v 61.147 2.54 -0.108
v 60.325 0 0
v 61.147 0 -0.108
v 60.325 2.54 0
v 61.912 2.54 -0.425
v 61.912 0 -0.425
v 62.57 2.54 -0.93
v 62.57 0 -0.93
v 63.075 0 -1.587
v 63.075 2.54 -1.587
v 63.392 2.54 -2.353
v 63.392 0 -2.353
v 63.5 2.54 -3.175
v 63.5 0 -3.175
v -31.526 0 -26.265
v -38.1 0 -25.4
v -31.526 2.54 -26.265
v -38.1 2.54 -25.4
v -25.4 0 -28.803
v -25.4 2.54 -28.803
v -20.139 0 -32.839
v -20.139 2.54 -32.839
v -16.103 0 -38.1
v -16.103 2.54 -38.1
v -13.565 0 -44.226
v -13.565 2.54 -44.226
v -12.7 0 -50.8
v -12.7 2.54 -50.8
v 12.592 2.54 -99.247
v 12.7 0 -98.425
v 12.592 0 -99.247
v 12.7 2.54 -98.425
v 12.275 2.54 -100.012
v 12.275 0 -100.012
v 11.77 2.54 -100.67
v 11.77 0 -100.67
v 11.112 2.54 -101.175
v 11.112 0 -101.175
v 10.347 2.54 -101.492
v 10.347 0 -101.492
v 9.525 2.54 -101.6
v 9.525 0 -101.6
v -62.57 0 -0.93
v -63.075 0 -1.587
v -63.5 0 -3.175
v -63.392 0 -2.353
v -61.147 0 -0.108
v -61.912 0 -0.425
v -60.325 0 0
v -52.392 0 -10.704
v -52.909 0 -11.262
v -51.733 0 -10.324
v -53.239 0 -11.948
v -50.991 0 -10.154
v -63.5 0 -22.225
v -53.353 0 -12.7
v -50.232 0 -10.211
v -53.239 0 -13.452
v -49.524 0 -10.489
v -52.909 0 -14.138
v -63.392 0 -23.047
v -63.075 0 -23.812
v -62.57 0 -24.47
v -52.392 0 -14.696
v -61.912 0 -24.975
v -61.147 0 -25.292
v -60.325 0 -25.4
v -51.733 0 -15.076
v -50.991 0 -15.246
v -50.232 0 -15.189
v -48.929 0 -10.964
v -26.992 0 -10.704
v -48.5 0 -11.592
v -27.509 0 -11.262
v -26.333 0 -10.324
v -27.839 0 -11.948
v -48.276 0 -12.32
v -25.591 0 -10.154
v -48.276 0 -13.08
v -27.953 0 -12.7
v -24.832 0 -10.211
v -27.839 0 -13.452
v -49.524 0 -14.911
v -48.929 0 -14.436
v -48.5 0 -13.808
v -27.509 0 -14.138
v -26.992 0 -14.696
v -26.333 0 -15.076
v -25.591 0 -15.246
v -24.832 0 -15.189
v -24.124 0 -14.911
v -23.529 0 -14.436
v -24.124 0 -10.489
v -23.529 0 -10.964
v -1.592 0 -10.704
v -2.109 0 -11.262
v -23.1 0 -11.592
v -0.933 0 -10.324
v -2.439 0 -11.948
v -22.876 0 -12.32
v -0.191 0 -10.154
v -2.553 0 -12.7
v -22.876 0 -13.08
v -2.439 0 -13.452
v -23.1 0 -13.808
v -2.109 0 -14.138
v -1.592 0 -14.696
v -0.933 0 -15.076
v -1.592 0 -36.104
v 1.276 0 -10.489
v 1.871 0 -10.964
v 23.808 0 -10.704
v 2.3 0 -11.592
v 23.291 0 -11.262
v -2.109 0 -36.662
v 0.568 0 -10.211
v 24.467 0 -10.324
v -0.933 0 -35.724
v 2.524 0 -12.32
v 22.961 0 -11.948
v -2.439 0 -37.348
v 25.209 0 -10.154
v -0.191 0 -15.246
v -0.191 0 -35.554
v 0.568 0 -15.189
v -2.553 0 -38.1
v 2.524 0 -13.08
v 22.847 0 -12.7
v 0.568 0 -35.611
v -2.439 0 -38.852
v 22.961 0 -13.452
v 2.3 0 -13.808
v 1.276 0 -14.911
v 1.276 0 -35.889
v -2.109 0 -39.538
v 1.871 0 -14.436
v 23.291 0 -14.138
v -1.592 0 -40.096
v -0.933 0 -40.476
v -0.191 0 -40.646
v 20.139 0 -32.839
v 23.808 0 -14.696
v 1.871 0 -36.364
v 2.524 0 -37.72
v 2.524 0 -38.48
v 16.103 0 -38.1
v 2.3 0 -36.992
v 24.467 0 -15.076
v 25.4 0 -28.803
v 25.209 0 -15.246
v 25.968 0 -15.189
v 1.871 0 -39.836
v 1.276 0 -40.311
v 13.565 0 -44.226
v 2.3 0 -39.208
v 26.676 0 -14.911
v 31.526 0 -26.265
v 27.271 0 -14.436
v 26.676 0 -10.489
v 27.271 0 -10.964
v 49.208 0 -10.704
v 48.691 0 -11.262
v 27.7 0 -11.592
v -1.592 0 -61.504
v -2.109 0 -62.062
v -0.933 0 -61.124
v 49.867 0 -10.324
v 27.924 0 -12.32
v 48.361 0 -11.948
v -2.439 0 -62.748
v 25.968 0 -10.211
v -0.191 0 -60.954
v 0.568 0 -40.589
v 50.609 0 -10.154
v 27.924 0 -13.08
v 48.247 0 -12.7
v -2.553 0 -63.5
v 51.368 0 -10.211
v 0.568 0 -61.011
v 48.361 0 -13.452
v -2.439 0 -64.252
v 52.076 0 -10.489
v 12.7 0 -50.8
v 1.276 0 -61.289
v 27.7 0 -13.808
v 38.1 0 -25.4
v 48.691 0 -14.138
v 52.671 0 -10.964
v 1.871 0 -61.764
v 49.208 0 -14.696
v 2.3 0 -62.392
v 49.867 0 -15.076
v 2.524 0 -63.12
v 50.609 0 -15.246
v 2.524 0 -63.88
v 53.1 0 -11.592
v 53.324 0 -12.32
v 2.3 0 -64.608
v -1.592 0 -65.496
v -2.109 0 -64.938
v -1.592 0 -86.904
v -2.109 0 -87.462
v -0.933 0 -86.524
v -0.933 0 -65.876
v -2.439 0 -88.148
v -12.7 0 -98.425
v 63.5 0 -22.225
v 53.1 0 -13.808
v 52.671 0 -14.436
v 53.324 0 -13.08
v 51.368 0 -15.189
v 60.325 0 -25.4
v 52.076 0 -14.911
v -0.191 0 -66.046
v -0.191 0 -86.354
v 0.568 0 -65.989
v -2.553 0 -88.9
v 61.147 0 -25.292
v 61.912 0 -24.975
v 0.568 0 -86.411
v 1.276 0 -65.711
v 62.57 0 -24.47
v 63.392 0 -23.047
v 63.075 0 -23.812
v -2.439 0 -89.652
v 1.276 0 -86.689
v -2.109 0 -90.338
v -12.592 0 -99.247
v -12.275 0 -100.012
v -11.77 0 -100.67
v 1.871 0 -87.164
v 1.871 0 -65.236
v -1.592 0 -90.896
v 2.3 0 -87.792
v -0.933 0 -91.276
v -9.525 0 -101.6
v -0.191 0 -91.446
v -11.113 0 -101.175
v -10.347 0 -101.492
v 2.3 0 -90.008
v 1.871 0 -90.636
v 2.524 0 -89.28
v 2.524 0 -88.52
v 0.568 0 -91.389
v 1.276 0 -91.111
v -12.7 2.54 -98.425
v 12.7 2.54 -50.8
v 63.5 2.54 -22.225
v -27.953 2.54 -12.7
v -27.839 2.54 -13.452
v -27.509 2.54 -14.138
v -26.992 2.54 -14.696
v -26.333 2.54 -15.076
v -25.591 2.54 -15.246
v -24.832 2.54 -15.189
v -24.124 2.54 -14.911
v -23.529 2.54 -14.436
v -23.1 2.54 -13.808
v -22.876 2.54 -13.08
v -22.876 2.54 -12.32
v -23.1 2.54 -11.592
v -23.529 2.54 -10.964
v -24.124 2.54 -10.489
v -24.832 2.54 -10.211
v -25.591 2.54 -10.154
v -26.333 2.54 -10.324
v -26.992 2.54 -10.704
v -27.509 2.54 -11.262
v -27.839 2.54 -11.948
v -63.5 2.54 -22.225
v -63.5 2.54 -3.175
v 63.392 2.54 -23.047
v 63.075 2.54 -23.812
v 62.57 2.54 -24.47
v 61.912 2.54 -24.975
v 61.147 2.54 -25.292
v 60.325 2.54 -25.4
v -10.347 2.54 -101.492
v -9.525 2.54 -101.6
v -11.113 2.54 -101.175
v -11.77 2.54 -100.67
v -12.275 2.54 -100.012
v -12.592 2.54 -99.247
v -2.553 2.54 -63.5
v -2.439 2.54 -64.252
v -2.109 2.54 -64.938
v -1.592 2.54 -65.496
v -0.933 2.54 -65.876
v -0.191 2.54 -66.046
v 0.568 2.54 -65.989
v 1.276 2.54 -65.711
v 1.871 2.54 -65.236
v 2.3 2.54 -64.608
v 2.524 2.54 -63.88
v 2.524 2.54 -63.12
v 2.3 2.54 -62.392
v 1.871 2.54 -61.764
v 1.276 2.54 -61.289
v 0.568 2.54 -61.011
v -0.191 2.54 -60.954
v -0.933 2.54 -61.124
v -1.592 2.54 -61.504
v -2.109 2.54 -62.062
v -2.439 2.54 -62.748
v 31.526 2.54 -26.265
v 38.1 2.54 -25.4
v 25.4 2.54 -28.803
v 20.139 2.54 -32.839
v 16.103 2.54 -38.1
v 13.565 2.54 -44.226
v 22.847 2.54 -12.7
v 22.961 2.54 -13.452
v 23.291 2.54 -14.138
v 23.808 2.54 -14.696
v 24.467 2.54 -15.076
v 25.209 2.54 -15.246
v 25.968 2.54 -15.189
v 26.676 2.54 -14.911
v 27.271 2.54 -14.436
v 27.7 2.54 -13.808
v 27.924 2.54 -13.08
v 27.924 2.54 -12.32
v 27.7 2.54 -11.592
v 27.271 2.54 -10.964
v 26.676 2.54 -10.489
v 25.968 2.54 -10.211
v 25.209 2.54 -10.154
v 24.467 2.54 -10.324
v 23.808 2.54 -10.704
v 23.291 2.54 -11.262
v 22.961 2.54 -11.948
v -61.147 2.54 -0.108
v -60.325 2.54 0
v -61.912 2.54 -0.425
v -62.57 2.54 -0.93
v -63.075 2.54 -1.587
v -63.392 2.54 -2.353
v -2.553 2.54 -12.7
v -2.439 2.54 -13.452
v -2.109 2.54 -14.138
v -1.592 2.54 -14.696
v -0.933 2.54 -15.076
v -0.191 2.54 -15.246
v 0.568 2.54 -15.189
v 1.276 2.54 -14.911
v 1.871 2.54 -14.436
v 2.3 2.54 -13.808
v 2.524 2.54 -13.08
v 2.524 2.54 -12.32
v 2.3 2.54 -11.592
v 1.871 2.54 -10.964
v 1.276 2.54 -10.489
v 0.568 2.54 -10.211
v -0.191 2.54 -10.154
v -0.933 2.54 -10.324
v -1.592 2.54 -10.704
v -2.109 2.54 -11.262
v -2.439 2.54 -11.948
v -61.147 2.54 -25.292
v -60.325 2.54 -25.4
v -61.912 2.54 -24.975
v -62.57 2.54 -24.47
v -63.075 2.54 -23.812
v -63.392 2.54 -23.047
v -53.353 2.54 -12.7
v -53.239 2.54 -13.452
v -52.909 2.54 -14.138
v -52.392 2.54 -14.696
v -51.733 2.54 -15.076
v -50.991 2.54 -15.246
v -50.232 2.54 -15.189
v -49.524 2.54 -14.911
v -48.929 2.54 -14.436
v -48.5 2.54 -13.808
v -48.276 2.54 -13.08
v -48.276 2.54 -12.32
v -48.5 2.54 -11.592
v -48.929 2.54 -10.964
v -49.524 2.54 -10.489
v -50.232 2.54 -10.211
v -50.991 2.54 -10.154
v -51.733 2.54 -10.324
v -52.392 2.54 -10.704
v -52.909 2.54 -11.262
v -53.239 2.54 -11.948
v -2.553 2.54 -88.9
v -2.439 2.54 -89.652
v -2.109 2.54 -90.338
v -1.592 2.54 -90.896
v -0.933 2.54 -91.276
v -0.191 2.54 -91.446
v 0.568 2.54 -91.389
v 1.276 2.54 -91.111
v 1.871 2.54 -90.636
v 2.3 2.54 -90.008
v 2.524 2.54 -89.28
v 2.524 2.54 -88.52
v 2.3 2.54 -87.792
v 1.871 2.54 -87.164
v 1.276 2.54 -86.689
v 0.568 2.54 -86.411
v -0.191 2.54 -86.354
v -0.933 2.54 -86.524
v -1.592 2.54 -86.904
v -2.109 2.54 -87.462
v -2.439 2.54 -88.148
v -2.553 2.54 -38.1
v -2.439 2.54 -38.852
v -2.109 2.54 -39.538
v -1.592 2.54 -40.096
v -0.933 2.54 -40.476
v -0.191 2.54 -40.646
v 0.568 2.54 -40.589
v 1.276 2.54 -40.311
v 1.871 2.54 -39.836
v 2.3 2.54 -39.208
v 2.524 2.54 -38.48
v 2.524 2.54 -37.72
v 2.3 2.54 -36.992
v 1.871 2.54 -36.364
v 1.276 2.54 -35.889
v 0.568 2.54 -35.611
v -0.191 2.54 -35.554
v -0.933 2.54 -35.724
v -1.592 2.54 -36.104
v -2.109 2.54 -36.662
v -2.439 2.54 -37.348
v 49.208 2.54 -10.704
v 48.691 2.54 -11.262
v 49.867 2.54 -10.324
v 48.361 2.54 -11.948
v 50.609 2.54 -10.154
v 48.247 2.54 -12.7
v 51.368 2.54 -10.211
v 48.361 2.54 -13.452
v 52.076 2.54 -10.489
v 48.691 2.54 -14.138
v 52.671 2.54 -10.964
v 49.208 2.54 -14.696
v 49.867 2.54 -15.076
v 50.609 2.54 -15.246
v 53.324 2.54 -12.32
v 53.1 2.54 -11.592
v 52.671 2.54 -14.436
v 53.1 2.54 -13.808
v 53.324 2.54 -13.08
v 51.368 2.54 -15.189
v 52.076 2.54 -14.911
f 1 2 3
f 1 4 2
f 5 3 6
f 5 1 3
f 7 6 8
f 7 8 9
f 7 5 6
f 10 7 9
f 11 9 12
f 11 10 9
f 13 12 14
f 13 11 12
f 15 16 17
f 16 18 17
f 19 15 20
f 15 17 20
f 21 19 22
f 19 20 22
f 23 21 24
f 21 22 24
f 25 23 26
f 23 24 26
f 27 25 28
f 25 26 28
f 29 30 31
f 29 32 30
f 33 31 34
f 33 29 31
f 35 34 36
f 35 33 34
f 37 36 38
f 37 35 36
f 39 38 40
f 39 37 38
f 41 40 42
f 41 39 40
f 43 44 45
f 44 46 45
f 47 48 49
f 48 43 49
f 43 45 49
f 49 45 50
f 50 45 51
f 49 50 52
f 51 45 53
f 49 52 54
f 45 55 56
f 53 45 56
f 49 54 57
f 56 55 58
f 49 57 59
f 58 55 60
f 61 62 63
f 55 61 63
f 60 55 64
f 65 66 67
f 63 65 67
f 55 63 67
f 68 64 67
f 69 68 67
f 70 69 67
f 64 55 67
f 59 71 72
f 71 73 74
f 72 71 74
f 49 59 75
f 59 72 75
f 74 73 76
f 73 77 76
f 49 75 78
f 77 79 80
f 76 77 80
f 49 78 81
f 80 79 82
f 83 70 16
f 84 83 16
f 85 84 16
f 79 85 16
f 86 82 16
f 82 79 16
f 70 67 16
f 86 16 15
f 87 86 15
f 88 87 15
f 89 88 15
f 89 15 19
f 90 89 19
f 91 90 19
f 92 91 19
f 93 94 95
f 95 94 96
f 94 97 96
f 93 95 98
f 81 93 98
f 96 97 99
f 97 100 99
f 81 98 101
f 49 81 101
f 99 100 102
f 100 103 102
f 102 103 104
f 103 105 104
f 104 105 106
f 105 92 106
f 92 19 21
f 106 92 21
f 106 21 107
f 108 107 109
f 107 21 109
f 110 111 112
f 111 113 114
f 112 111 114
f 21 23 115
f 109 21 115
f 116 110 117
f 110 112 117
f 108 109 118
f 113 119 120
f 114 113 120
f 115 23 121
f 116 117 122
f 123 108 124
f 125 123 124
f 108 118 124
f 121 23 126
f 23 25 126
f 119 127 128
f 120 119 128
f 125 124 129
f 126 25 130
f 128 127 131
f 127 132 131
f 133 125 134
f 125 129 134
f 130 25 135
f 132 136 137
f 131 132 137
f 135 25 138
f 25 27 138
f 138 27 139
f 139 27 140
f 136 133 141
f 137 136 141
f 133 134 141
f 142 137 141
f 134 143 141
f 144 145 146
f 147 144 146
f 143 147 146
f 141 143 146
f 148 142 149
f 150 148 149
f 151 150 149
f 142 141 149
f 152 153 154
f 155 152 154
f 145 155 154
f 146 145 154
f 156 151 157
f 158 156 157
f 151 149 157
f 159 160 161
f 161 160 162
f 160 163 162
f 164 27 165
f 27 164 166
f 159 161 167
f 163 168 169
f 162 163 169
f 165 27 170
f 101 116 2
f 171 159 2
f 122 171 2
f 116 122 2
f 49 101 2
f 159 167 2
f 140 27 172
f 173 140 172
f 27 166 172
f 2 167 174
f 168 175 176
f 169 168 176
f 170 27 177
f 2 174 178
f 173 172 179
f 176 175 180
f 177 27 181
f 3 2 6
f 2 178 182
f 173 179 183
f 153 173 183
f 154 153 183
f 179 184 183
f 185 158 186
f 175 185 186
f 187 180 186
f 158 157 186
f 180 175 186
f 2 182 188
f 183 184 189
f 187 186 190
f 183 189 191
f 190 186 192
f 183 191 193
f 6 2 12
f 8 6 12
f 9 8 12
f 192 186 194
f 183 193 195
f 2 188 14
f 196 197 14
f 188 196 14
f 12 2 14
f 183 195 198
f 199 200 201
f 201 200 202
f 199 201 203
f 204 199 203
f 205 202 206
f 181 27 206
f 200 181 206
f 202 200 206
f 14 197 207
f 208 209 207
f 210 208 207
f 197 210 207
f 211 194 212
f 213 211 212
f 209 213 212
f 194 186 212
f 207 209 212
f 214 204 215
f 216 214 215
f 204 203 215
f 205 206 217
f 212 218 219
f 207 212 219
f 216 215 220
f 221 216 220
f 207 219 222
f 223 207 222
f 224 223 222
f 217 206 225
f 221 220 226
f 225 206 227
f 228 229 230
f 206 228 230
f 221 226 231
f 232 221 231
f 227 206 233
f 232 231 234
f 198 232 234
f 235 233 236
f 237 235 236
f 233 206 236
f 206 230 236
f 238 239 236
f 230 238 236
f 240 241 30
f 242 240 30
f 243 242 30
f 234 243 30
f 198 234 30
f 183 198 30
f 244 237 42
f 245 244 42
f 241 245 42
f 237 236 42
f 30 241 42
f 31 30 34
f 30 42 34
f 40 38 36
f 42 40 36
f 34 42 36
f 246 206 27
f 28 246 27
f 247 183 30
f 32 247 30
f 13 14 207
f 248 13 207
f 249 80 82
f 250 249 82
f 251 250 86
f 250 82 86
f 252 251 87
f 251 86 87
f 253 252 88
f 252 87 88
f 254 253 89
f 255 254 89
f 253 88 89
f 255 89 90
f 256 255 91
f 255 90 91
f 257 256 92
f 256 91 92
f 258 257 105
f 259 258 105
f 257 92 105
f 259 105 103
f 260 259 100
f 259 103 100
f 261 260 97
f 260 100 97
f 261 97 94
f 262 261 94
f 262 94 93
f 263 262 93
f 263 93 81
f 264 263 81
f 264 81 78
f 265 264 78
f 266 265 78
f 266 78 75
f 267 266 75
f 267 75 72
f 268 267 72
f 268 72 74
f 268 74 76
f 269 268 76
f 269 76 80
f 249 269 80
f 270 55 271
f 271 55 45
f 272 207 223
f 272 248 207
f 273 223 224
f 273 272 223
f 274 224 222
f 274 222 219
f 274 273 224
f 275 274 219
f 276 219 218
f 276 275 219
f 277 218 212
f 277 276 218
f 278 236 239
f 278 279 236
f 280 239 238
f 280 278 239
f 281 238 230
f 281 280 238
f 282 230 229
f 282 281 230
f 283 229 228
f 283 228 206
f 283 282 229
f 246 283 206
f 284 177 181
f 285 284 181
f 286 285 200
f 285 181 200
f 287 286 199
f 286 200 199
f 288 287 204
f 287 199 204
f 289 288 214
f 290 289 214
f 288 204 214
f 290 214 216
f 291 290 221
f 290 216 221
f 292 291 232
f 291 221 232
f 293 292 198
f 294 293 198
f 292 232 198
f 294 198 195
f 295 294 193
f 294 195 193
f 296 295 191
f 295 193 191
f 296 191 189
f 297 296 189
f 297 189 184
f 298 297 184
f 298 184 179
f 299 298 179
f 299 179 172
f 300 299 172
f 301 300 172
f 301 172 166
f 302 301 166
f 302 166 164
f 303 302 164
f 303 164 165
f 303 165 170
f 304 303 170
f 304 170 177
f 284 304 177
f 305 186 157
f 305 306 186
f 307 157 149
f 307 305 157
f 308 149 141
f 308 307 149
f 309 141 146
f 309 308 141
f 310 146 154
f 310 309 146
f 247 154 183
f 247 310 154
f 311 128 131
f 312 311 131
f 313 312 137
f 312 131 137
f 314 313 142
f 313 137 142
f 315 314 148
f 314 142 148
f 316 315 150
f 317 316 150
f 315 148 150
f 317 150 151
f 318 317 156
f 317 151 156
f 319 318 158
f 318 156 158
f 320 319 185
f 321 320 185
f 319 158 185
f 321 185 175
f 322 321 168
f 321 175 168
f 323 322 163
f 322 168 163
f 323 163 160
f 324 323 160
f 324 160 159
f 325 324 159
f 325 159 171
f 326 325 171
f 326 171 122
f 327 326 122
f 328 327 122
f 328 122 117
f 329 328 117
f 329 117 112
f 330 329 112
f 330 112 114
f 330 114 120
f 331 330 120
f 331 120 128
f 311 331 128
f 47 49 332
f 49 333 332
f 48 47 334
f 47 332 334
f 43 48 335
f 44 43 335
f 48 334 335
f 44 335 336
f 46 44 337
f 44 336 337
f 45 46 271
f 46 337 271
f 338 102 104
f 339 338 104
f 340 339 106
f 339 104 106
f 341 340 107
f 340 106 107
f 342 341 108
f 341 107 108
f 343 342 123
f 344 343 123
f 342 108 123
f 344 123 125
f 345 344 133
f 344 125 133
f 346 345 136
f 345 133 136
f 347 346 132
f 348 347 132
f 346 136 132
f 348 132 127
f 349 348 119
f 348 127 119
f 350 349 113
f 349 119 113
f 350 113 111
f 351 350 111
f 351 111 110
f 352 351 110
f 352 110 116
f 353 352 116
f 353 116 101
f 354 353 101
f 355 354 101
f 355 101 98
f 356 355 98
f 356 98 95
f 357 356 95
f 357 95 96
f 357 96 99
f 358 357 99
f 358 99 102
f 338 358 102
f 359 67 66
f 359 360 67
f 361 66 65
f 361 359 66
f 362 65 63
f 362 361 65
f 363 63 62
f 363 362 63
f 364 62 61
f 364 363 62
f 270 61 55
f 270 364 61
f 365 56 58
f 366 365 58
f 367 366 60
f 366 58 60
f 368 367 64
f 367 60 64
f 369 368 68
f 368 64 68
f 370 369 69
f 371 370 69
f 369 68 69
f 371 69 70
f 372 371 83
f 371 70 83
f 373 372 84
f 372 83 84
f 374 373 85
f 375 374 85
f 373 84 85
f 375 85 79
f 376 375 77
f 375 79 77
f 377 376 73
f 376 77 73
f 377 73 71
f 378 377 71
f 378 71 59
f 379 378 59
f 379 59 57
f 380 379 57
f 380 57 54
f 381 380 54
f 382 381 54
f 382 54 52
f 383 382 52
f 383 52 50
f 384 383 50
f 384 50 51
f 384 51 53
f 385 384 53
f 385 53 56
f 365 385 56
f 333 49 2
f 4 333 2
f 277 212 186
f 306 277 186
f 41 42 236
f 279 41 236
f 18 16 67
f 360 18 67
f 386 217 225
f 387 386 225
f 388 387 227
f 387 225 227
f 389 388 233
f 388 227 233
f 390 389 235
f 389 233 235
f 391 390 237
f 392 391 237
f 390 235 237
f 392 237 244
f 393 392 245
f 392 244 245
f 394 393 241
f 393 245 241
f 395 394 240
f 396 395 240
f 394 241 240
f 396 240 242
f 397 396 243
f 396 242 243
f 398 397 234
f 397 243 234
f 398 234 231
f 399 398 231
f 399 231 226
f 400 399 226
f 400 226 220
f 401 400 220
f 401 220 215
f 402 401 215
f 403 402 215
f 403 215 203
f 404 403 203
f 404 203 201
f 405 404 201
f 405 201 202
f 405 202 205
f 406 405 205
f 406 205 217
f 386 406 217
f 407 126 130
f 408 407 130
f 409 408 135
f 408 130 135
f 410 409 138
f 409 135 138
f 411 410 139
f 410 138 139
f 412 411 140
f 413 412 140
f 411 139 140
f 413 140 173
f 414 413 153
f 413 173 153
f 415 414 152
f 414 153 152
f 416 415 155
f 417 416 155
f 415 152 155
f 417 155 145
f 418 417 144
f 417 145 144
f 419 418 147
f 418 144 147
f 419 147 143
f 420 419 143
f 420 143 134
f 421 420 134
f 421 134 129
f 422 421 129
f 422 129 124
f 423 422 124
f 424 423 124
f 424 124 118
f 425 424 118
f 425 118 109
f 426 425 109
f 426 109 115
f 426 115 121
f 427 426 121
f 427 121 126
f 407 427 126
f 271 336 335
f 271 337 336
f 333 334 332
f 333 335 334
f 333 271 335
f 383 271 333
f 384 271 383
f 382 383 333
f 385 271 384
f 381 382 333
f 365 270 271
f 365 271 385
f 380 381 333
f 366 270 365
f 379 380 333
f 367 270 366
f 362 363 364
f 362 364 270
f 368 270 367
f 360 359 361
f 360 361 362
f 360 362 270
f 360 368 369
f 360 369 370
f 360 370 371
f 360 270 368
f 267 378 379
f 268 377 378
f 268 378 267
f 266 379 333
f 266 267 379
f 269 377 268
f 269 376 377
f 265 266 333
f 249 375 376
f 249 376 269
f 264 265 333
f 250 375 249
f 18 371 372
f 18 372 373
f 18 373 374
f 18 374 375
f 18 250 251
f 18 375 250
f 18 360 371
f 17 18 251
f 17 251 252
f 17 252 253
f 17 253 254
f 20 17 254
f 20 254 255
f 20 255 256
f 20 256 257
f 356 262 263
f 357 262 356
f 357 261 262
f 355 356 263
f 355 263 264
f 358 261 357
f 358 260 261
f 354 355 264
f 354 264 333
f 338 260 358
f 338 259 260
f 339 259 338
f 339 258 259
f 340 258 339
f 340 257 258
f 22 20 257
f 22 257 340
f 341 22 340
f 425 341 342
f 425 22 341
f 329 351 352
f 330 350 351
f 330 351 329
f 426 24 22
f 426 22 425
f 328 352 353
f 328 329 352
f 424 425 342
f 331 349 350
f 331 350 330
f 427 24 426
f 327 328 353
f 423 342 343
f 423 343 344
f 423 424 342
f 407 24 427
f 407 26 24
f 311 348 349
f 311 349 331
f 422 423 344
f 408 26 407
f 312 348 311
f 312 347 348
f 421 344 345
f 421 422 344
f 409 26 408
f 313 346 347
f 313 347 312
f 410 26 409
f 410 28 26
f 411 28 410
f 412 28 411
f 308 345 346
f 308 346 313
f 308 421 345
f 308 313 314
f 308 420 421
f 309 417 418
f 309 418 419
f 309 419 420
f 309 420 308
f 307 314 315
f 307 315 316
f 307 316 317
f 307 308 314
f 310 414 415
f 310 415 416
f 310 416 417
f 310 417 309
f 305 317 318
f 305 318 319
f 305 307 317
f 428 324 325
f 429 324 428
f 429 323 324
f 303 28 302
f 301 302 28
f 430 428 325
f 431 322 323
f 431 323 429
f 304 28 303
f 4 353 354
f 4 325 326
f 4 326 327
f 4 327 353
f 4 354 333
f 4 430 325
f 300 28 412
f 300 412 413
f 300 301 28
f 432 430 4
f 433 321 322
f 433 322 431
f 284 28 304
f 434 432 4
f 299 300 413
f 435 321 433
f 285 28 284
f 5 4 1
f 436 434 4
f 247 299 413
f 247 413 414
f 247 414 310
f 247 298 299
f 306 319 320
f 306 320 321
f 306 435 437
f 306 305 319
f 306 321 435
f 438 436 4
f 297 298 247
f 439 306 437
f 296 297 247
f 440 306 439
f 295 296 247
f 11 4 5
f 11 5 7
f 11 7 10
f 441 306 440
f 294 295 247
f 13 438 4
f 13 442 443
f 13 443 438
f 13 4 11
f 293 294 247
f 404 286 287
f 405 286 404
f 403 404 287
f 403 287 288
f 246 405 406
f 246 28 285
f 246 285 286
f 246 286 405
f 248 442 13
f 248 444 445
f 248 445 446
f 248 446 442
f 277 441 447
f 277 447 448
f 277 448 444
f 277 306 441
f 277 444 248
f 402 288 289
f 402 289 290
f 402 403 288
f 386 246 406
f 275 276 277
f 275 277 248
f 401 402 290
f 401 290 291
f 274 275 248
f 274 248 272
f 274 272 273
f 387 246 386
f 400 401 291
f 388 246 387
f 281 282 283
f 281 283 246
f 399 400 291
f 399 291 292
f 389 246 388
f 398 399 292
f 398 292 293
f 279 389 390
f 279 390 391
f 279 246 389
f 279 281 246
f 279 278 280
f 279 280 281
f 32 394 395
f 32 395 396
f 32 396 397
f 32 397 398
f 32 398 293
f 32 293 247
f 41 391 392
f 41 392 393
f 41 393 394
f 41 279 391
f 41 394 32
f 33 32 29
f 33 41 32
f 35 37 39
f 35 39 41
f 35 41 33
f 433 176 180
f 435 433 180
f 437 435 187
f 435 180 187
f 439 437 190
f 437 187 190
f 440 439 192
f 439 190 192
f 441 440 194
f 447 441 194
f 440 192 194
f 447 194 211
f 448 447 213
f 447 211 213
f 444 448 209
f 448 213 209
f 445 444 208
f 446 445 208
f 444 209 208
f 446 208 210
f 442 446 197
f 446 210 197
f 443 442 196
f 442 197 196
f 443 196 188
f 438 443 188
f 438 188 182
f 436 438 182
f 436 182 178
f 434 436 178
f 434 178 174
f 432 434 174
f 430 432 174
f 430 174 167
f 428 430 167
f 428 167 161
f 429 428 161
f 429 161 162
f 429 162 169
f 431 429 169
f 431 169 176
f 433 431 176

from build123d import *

# Parameters (mm, degrees)
BOSS_EXTRUDE1_DEPTH        = 2.54
FILLET1_R                  = 3.175
F_7_0_201_DIAMETER_HOLE1_D = 5.1054
FILLET2_R                  = 25.4


with BuildPart() as part:
    # Sketch1 → Boss-Extrude1 (new body)
    with BuildSketch(Plane(origin=(0, 0, 0), x_dir=(1, 0, 0), z_dir=(0, 1, 0))):
        Polygon((-63.5, 0), (63.5, 0), (63.5, 25.4), (12.7, 25.4), (12.7, 101.6), (-12.7, 101.6), (-12.7, 25.4), (-63.5, 25.4), align=None)
    extrude(amount=BOSS_EXTRUDE1_DEPTH)

    # Fillet1
    fillet1_edges = [part.edges().sort_by_distance(p)[0] for p in [
        (-12.7, 1.27, -101.6),
        (12.7, 1.27, -101.6),
        (63.5, 1.27, -25.4),
        (63.5, 1.27, 0),
        (-63.5, 1.27, 0),
        (-63.5, 1.27, -25.4),
    ]]
    fillet(fillet1_edges, radius=FILLET1_R)

    # #7 (0.201) Diameter Hole1 (through all)
    with Locations(Plane(origin=(0, 2.54, 0), x_dir=(1, 0, 0), z_dir=(0, 1, 0))):
        with Locations((0, 12.7), (25.4, 12.7), (50.8, 12.7), (-25.4, 12.7), (-50.8, 12.7), (0, 38.1), (0, 63.5), (0, 88.9)):
            Hole(F_7_0_201_DIAMETER_HOLE1_D / 2)

    # Fillet2
    fillet2_edges = [part.edges().sort_by_distance(p)[0] for p in [
        (12.7, 1.27, -25.4),
        (-12.7, 1.27, -25.4),
    ]]
    fillet(fillet2_edges, radius=FILLET2_R)


solid = part.part
